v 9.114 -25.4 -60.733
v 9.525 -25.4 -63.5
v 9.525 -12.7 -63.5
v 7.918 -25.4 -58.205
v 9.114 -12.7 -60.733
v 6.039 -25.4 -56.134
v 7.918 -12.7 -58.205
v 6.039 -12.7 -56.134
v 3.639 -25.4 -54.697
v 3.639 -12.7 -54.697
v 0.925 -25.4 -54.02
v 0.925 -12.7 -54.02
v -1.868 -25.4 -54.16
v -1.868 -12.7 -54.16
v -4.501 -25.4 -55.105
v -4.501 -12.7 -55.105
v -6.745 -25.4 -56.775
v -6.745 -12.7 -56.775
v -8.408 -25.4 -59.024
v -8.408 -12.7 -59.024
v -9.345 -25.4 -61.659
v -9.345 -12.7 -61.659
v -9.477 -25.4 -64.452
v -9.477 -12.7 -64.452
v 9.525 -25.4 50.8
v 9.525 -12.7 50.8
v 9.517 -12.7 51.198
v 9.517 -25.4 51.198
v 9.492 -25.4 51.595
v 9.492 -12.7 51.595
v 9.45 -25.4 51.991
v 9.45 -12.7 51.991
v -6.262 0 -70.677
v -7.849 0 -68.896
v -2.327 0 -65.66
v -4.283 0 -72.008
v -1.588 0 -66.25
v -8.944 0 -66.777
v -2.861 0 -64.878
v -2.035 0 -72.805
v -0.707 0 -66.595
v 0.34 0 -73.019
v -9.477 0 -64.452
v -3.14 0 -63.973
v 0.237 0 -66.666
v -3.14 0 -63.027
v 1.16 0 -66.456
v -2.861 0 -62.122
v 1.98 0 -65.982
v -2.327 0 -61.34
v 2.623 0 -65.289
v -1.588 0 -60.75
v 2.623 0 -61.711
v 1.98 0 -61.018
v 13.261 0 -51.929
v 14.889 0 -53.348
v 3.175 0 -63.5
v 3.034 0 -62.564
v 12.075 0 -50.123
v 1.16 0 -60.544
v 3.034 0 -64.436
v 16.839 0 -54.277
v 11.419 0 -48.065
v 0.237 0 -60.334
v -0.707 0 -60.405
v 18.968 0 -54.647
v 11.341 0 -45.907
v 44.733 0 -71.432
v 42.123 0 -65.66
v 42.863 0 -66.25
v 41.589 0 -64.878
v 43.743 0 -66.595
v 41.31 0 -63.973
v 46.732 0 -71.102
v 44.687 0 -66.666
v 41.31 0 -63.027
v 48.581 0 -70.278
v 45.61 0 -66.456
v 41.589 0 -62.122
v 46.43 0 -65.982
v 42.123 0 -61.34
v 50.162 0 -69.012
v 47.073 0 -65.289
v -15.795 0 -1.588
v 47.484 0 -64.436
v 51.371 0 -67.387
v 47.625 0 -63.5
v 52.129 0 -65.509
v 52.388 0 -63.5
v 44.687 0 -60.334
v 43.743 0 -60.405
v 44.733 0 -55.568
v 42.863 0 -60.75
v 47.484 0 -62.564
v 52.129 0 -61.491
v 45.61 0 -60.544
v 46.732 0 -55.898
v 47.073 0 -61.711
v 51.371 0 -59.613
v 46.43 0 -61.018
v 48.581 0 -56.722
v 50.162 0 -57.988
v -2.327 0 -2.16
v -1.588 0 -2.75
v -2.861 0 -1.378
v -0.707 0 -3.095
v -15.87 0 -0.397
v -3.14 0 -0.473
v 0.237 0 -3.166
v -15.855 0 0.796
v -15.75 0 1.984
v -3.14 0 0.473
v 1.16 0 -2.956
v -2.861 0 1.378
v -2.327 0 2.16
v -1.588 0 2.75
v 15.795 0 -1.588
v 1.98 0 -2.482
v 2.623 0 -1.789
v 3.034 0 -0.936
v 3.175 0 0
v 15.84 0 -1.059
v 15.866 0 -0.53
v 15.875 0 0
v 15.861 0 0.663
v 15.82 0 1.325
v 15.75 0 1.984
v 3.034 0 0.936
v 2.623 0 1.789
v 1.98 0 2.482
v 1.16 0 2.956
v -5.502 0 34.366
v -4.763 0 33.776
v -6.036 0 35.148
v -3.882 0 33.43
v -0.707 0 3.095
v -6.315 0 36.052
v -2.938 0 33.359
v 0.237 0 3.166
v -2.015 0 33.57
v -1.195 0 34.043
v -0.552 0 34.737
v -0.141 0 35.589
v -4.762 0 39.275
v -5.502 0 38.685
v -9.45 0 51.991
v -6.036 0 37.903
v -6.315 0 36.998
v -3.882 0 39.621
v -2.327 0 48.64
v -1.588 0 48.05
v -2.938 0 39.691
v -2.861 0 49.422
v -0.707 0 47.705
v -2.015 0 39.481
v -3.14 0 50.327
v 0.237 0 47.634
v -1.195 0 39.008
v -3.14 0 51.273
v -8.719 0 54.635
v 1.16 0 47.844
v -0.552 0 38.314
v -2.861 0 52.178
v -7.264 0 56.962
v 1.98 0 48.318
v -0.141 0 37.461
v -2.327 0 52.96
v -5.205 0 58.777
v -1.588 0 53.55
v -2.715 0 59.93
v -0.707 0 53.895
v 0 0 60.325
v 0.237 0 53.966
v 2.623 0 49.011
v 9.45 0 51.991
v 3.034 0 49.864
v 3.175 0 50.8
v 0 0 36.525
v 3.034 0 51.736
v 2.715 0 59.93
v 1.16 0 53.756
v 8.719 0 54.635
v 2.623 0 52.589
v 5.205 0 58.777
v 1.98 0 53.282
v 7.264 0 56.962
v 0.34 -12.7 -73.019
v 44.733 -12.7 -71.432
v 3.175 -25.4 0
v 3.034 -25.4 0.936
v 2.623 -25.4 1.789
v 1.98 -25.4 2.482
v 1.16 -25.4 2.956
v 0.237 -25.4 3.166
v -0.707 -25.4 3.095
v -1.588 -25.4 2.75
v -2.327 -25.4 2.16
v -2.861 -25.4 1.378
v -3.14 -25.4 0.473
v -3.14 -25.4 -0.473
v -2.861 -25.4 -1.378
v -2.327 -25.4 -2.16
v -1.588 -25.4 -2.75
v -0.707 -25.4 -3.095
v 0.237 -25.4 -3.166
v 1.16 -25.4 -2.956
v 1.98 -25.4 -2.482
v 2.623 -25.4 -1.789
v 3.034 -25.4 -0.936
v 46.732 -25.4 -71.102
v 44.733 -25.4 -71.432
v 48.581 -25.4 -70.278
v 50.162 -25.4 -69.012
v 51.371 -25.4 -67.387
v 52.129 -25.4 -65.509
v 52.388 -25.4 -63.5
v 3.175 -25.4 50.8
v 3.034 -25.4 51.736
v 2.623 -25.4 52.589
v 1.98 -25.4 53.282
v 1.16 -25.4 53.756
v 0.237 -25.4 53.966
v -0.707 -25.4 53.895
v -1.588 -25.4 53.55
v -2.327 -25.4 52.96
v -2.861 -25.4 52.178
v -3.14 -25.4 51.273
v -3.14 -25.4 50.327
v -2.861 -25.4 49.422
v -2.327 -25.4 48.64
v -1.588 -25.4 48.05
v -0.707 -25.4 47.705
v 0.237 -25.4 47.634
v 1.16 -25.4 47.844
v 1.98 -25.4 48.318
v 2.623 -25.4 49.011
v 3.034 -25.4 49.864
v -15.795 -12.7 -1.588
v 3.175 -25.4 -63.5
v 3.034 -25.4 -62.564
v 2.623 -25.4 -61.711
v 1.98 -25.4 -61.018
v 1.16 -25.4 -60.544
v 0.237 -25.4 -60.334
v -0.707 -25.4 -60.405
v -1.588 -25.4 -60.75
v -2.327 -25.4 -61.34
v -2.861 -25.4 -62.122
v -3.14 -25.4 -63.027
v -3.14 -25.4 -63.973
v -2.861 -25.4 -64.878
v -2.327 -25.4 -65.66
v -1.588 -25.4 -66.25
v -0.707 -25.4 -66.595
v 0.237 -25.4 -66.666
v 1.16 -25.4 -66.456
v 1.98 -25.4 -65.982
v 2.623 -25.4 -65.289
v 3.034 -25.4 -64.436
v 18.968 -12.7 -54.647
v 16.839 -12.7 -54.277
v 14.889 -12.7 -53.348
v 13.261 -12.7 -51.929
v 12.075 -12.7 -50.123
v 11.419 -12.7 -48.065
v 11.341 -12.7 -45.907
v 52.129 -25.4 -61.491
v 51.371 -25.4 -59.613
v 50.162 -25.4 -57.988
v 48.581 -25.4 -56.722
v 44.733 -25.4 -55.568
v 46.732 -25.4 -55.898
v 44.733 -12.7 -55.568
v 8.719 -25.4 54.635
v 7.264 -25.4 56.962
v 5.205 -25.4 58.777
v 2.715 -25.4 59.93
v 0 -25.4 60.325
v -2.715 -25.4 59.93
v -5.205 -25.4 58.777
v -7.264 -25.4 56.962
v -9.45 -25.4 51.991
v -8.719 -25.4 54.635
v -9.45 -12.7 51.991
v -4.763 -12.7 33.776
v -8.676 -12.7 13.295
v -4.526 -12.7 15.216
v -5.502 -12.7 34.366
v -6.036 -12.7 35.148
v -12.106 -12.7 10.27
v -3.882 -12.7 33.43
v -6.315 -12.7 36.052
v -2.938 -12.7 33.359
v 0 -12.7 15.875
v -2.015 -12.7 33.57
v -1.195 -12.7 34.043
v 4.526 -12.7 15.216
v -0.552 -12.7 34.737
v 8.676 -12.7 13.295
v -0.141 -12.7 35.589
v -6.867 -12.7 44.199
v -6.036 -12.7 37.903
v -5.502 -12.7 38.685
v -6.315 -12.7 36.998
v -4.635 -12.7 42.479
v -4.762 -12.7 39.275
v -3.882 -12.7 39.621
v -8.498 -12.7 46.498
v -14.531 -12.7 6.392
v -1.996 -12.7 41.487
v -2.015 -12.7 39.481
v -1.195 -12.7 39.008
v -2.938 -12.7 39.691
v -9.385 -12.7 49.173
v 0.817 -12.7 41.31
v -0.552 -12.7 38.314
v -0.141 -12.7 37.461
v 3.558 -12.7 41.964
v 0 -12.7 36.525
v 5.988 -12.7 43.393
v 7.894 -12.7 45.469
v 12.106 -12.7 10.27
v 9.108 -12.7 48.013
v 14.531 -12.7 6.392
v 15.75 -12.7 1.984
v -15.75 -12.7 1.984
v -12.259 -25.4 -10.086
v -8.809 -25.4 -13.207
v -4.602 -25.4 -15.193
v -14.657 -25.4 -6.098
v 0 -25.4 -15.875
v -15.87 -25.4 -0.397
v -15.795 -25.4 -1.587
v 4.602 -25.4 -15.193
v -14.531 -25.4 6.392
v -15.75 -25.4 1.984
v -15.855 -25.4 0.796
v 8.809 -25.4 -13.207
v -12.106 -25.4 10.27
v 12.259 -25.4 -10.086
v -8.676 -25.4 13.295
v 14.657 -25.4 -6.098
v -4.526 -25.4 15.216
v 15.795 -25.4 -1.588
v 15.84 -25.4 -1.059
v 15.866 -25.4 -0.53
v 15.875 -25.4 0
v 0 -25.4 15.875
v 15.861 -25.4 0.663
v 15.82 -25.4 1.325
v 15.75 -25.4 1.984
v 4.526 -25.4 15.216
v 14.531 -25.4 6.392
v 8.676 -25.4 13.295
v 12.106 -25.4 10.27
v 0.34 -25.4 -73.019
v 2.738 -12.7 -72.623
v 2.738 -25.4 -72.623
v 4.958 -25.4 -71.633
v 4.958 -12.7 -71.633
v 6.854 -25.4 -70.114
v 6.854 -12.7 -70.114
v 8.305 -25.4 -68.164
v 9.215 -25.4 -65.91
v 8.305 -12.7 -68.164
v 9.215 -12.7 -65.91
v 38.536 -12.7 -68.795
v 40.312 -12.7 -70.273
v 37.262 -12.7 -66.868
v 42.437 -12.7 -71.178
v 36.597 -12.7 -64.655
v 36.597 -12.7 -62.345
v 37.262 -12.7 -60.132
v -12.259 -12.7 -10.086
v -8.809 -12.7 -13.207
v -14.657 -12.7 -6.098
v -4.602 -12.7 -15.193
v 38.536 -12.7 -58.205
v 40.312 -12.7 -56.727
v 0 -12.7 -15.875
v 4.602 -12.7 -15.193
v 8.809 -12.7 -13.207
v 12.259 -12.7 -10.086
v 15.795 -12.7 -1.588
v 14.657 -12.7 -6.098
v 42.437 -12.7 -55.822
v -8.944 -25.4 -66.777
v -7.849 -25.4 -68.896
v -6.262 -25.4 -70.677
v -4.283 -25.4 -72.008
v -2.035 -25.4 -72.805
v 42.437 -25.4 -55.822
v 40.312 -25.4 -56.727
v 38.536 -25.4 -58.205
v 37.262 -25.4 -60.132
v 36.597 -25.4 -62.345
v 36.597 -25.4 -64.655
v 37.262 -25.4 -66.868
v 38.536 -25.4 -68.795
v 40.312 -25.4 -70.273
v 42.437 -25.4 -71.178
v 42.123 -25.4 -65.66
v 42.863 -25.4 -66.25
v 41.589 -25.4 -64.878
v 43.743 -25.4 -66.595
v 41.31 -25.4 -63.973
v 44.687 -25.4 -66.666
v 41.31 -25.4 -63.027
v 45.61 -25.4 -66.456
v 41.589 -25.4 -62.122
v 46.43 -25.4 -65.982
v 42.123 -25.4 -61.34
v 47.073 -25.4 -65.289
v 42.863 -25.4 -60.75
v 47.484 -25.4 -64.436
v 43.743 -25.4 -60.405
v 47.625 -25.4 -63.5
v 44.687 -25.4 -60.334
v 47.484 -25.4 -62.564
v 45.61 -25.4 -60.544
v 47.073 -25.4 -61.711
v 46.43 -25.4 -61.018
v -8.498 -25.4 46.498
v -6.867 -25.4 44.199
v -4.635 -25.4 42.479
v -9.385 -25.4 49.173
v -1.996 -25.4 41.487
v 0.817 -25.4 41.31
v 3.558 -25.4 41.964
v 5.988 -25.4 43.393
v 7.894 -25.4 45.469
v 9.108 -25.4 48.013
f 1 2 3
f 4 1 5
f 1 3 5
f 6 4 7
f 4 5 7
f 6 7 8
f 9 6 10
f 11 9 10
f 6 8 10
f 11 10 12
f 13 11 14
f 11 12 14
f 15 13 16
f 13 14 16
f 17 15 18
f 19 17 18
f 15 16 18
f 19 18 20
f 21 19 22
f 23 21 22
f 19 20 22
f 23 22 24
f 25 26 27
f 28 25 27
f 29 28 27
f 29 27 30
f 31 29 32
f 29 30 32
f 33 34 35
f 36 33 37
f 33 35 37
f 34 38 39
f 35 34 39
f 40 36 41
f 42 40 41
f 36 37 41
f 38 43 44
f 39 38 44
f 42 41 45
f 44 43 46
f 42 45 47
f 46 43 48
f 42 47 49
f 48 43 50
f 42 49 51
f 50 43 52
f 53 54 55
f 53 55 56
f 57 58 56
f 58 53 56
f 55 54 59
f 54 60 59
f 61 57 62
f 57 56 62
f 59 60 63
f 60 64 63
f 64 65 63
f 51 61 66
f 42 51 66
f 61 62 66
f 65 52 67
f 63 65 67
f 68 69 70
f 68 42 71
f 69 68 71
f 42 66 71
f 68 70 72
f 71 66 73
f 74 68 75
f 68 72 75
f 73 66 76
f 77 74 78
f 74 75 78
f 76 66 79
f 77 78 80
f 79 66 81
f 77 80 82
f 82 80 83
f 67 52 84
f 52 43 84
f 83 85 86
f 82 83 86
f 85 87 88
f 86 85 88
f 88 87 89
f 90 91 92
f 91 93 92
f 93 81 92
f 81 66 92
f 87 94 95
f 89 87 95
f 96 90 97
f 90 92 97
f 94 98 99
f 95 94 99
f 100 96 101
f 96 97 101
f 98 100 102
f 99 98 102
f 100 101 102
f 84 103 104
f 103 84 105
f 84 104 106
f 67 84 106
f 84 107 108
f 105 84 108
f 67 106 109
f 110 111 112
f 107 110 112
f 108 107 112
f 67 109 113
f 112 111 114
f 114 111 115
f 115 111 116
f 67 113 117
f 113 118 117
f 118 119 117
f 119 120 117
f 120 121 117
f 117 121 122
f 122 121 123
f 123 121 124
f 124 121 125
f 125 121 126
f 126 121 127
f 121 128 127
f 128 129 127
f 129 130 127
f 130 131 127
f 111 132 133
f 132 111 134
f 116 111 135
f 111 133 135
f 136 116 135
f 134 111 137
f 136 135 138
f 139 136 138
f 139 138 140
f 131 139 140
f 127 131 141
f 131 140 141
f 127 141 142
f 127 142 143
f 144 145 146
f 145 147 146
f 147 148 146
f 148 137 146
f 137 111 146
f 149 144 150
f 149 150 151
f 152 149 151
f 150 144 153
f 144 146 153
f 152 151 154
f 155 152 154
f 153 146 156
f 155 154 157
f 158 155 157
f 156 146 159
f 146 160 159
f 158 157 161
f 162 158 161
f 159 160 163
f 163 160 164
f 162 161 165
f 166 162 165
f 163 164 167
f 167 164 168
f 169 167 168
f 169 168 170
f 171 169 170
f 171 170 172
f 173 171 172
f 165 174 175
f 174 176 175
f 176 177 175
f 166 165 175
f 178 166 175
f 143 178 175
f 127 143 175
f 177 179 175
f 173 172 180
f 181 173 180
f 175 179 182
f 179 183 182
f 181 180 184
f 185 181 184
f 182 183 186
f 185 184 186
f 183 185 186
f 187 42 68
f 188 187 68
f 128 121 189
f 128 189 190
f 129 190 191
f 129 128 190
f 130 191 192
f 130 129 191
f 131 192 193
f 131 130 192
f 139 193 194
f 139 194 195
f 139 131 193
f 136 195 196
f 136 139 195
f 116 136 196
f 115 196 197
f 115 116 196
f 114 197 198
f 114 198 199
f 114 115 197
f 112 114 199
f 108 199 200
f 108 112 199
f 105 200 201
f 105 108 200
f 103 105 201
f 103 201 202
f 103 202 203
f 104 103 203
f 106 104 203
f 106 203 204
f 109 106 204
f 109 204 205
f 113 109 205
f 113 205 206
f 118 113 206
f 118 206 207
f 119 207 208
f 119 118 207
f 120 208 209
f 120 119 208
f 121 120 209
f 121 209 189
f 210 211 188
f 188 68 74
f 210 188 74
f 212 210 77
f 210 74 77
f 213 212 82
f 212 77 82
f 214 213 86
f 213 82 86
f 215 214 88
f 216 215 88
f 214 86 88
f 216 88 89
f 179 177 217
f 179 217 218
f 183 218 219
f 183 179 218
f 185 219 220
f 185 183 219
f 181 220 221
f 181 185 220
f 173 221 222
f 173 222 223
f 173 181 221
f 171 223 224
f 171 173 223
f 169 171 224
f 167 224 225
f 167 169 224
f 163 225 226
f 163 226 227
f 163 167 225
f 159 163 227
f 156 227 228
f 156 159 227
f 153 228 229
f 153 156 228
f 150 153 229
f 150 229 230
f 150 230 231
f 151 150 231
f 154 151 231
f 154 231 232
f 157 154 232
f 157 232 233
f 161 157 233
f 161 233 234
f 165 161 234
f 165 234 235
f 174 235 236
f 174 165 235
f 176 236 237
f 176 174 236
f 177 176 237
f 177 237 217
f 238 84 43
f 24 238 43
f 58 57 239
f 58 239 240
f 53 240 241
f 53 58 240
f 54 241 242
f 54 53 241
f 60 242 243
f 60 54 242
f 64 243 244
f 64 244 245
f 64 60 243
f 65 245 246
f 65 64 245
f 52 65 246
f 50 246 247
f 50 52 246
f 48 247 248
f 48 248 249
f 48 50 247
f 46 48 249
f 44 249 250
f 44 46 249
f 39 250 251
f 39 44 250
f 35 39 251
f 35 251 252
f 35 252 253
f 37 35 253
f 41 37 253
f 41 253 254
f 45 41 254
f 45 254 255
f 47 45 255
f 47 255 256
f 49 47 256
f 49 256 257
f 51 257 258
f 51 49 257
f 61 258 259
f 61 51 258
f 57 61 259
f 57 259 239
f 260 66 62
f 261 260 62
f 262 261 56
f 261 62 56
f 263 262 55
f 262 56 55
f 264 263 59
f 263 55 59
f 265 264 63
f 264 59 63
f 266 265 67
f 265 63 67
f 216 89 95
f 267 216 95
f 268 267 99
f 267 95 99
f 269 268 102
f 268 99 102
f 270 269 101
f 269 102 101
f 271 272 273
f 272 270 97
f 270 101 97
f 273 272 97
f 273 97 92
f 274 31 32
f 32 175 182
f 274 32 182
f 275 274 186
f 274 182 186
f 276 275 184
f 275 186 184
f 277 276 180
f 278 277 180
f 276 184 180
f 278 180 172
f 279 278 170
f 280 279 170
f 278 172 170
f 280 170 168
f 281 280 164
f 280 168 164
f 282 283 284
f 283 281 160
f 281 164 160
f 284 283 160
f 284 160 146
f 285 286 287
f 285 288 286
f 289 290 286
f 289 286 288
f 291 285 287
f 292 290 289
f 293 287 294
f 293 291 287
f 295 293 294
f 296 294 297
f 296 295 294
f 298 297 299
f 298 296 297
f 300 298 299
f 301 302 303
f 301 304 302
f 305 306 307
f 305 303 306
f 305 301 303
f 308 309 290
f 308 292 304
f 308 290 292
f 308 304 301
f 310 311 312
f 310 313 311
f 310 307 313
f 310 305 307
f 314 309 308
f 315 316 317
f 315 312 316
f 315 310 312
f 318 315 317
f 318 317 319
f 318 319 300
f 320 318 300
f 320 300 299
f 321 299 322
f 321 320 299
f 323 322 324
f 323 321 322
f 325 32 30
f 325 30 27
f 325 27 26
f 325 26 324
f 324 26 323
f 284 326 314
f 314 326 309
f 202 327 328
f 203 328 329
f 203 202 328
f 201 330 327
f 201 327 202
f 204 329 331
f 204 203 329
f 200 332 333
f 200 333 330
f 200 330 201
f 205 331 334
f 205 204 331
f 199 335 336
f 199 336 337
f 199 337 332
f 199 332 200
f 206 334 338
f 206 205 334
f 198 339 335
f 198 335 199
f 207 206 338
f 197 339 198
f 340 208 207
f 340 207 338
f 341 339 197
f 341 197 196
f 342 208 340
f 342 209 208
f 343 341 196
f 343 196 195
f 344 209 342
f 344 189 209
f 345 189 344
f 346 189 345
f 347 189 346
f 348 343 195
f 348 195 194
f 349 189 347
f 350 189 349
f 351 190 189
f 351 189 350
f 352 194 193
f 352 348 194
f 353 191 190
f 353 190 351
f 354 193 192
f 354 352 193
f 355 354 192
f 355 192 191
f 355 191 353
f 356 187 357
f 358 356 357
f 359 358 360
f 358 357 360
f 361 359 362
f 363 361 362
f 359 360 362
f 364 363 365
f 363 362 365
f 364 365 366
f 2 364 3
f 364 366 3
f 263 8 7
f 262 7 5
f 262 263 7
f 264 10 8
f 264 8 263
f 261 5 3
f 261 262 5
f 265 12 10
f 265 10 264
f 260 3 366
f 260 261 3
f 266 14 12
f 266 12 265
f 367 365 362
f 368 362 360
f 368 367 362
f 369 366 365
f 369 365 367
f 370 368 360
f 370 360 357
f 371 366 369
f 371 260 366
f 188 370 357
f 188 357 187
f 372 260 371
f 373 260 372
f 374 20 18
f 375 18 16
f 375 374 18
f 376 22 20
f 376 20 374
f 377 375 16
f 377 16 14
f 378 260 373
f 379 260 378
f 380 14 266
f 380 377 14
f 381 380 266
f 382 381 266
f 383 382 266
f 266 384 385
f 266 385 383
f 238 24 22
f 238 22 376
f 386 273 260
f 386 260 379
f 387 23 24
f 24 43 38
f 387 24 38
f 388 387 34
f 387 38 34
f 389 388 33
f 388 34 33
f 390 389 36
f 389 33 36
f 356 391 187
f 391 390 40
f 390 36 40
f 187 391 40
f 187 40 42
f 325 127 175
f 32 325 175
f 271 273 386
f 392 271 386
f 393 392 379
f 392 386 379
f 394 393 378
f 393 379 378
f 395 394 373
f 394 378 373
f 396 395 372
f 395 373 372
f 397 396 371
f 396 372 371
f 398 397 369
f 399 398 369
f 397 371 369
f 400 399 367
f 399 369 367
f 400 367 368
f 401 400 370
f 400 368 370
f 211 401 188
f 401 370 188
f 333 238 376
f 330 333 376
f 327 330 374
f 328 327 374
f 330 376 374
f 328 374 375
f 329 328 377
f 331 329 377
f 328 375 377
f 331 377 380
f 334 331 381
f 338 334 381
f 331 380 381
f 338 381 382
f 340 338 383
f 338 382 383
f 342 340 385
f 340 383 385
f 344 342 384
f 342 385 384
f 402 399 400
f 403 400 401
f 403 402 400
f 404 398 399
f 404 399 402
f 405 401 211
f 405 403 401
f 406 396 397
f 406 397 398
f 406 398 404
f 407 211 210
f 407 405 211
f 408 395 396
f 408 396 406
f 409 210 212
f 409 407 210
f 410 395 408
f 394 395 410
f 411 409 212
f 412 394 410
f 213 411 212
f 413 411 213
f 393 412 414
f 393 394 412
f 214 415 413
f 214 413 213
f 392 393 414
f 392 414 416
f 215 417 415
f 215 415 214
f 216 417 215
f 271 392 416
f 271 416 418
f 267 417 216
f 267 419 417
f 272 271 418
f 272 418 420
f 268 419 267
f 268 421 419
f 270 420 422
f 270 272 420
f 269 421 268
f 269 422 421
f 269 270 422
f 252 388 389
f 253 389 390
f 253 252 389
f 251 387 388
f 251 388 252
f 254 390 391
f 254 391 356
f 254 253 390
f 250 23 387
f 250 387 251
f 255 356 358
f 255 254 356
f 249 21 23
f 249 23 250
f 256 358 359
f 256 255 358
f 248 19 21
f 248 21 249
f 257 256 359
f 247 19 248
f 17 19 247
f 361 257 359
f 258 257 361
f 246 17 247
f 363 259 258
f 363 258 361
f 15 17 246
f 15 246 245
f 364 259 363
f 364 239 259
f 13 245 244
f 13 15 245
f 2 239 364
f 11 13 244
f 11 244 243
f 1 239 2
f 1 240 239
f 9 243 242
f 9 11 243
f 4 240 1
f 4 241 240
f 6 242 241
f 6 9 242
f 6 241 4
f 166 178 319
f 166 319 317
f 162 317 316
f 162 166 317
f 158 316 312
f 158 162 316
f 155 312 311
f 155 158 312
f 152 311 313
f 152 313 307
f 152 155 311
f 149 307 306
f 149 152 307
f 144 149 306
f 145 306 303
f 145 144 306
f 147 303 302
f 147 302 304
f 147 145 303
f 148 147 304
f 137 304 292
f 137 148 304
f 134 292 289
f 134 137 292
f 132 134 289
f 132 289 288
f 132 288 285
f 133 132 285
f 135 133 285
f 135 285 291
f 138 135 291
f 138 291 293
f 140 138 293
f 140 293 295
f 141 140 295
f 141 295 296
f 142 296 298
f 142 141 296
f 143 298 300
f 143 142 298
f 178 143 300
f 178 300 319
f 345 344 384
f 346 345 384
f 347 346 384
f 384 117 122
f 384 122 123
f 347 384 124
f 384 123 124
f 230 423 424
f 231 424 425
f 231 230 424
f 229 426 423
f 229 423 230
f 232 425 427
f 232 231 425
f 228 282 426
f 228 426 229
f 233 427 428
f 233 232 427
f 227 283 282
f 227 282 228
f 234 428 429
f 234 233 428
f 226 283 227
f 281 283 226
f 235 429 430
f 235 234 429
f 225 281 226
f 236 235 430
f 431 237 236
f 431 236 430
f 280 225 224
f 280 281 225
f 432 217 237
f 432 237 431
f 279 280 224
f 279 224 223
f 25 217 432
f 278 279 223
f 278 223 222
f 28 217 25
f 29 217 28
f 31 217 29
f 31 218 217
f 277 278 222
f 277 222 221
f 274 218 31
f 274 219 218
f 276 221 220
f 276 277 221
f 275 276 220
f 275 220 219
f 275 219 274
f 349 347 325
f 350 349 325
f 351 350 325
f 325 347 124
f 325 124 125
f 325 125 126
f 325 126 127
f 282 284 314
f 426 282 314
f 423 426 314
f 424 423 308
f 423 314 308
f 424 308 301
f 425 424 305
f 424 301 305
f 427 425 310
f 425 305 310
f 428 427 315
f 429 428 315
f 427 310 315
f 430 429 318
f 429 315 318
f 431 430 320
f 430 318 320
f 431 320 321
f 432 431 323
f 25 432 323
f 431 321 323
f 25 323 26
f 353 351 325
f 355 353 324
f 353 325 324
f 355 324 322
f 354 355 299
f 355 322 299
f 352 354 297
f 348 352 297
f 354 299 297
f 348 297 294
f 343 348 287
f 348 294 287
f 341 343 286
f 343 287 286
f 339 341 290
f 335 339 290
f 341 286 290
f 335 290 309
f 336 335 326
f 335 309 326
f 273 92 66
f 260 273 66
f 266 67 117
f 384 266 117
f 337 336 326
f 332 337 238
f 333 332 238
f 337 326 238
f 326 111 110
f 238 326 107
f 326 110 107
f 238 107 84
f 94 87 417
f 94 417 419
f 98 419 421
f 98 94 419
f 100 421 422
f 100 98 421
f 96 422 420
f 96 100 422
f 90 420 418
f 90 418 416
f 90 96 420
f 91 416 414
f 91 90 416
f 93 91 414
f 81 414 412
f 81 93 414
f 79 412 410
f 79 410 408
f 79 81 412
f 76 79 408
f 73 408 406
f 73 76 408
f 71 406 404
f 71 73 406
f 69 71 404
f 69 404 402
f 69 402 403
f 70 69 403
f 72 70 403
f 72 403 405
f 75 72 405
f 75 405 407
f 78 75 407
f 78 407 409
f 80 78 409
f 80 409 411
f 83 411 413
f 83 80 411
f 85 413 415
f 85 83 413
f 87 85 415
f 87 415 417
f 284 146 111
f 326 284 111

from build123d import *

# Parameters (mm, degrees)
F0_R     = 3.175
F1_DEPTH = 25.4
F2_DEPTH = 12.7


with BuildPart() as f1:
    # F0 (on Front) → F1 (new body)
    with BuildSketch(Plane.XZ):
        with BuildLine():
            ThreePointArc((9.525, 50.8), (9.506305, 51.396483), (9.450293, 51.990625))
            ThreePointArc((9.450293, 51.990625), (0, 60.325), (-9.450293, 51.990625))
            ThreePointArc((-9.450293, 51.990625), (-0.596483, 41.293695), (9.525, 50.8))
        make_face()
        with Locations((0, 50.8)):
            Circle(F0_R, mode=Mode.SUBTRACT)
        with BuildLine():
            ThreePointArc((15.795426, -1.5875), (15.855094, -0.794747), (15.875, 0))
            ThreePointArc((15.875, 0), (15.843841, 0.994139), (15.750488, 1.984375))
            ThreePointArc((15.750488, 1.984375), (0, 15.875), (-15.750488, 1.984375))
            ThreePointArc((-15.750488, 1.984375), (-15.873744, 0.199705), (-15.795426, -1.5875))
            ThreePointArc((-15.795426, -1.5875), (0, -15.875), (15.795426, -1.5875))
        make_face()
        Circle(F0_R, mode=Mode.SUBTRACT)
        with BuildLine():
            ThreePointArc((9.525, -63.5), (-0.476848, -53.986944), (-9.477255, -64.4525))
            ThreePointArc((-9.477255, -64.4525), (-6.262383, -70.67692), (0.340179, -73.018923))
            ThreePointArc((0.340179, -73.018923), (6.854408, -70.113827), (9.525, -63.5))
        make_face()
        with Locations((0, -63.5)):
            Circle(F0_R, mode=Mode.SUBTRACT)
        with BuildLine():
            ThreePointArc((52.3875, -63.5), (50.162007, -57.988477), (44.733482, -55.567564))
            ThreePointArc((44.733482, -55.567564), (36.5125, -63.5), (44.733482, -71.432436))
            ThreePointArc((44.733482, -71.432436), (50.162007, -69.011523), (52.3875, -63.5))
        make_face()
        with Locations((44.45, -63.5)):
            Circle(F0_R, mode=Mode.SUBTRACT)
    extrude(amount=F1_DEPTH)

    # F0 (on Front) → F2 (join)
    with BuildSketch(Plane.XZ):
        with BuildLine():
            ThreePointArc((-15.750488, 1.984375), (0, 15.875), (15.750488, 1.984375))
            Line((15.750488, 1.984375), (9.450293, 51.990625))
            ThreePointArc((9.450293, 51.990625), (9.506305, 51.396483), (9.525, 50.8))
            ThreePointArc((9.525, 50.8), (-0.596483, 41.293695), (-9.450293, 51.990625))
            Line((-9.450293, 51.990625), (-15.750488, 1.984375))
        make_face()
        with Locations((-3.175, 36.5252)):
            Circle(F0_R, mode=Mode.SUBTRACT)
        with BuildLine():
            Line((11.341187, -45.906618), (15.795426, -1.5875))
            ThreePointArc((15.795426, -1.5875), (0, -15.875), (-15.795426, -1.5875))
            Line((-15.795426, -1.5875), (-9.477255, -64.4525))
            ThreePointArc((-9.477255, -64.4525), (-0.476848, -53.986944), (9.525, -63.5))
            ThreePointArc((9.525, -63.5), (6.854408, -70.113827), (0.340179, -73.018923))
            Line((0.340179, -73.018923), (44.733482, -71.432436))
            ThreePointArc((44.733482, -71.432436), (36.5125, -63.5), (44.733482, -55.567564))
            Line((44.733482, -55.567564), (18.9676, -54.646766))
            ThreePointArc((18.9676, -54.646766), (13.2612, -51.928641), (11.341187, -45.906618))
        make_face()
    extrude(amount=F2_DEPTH)


solid = f1.part
